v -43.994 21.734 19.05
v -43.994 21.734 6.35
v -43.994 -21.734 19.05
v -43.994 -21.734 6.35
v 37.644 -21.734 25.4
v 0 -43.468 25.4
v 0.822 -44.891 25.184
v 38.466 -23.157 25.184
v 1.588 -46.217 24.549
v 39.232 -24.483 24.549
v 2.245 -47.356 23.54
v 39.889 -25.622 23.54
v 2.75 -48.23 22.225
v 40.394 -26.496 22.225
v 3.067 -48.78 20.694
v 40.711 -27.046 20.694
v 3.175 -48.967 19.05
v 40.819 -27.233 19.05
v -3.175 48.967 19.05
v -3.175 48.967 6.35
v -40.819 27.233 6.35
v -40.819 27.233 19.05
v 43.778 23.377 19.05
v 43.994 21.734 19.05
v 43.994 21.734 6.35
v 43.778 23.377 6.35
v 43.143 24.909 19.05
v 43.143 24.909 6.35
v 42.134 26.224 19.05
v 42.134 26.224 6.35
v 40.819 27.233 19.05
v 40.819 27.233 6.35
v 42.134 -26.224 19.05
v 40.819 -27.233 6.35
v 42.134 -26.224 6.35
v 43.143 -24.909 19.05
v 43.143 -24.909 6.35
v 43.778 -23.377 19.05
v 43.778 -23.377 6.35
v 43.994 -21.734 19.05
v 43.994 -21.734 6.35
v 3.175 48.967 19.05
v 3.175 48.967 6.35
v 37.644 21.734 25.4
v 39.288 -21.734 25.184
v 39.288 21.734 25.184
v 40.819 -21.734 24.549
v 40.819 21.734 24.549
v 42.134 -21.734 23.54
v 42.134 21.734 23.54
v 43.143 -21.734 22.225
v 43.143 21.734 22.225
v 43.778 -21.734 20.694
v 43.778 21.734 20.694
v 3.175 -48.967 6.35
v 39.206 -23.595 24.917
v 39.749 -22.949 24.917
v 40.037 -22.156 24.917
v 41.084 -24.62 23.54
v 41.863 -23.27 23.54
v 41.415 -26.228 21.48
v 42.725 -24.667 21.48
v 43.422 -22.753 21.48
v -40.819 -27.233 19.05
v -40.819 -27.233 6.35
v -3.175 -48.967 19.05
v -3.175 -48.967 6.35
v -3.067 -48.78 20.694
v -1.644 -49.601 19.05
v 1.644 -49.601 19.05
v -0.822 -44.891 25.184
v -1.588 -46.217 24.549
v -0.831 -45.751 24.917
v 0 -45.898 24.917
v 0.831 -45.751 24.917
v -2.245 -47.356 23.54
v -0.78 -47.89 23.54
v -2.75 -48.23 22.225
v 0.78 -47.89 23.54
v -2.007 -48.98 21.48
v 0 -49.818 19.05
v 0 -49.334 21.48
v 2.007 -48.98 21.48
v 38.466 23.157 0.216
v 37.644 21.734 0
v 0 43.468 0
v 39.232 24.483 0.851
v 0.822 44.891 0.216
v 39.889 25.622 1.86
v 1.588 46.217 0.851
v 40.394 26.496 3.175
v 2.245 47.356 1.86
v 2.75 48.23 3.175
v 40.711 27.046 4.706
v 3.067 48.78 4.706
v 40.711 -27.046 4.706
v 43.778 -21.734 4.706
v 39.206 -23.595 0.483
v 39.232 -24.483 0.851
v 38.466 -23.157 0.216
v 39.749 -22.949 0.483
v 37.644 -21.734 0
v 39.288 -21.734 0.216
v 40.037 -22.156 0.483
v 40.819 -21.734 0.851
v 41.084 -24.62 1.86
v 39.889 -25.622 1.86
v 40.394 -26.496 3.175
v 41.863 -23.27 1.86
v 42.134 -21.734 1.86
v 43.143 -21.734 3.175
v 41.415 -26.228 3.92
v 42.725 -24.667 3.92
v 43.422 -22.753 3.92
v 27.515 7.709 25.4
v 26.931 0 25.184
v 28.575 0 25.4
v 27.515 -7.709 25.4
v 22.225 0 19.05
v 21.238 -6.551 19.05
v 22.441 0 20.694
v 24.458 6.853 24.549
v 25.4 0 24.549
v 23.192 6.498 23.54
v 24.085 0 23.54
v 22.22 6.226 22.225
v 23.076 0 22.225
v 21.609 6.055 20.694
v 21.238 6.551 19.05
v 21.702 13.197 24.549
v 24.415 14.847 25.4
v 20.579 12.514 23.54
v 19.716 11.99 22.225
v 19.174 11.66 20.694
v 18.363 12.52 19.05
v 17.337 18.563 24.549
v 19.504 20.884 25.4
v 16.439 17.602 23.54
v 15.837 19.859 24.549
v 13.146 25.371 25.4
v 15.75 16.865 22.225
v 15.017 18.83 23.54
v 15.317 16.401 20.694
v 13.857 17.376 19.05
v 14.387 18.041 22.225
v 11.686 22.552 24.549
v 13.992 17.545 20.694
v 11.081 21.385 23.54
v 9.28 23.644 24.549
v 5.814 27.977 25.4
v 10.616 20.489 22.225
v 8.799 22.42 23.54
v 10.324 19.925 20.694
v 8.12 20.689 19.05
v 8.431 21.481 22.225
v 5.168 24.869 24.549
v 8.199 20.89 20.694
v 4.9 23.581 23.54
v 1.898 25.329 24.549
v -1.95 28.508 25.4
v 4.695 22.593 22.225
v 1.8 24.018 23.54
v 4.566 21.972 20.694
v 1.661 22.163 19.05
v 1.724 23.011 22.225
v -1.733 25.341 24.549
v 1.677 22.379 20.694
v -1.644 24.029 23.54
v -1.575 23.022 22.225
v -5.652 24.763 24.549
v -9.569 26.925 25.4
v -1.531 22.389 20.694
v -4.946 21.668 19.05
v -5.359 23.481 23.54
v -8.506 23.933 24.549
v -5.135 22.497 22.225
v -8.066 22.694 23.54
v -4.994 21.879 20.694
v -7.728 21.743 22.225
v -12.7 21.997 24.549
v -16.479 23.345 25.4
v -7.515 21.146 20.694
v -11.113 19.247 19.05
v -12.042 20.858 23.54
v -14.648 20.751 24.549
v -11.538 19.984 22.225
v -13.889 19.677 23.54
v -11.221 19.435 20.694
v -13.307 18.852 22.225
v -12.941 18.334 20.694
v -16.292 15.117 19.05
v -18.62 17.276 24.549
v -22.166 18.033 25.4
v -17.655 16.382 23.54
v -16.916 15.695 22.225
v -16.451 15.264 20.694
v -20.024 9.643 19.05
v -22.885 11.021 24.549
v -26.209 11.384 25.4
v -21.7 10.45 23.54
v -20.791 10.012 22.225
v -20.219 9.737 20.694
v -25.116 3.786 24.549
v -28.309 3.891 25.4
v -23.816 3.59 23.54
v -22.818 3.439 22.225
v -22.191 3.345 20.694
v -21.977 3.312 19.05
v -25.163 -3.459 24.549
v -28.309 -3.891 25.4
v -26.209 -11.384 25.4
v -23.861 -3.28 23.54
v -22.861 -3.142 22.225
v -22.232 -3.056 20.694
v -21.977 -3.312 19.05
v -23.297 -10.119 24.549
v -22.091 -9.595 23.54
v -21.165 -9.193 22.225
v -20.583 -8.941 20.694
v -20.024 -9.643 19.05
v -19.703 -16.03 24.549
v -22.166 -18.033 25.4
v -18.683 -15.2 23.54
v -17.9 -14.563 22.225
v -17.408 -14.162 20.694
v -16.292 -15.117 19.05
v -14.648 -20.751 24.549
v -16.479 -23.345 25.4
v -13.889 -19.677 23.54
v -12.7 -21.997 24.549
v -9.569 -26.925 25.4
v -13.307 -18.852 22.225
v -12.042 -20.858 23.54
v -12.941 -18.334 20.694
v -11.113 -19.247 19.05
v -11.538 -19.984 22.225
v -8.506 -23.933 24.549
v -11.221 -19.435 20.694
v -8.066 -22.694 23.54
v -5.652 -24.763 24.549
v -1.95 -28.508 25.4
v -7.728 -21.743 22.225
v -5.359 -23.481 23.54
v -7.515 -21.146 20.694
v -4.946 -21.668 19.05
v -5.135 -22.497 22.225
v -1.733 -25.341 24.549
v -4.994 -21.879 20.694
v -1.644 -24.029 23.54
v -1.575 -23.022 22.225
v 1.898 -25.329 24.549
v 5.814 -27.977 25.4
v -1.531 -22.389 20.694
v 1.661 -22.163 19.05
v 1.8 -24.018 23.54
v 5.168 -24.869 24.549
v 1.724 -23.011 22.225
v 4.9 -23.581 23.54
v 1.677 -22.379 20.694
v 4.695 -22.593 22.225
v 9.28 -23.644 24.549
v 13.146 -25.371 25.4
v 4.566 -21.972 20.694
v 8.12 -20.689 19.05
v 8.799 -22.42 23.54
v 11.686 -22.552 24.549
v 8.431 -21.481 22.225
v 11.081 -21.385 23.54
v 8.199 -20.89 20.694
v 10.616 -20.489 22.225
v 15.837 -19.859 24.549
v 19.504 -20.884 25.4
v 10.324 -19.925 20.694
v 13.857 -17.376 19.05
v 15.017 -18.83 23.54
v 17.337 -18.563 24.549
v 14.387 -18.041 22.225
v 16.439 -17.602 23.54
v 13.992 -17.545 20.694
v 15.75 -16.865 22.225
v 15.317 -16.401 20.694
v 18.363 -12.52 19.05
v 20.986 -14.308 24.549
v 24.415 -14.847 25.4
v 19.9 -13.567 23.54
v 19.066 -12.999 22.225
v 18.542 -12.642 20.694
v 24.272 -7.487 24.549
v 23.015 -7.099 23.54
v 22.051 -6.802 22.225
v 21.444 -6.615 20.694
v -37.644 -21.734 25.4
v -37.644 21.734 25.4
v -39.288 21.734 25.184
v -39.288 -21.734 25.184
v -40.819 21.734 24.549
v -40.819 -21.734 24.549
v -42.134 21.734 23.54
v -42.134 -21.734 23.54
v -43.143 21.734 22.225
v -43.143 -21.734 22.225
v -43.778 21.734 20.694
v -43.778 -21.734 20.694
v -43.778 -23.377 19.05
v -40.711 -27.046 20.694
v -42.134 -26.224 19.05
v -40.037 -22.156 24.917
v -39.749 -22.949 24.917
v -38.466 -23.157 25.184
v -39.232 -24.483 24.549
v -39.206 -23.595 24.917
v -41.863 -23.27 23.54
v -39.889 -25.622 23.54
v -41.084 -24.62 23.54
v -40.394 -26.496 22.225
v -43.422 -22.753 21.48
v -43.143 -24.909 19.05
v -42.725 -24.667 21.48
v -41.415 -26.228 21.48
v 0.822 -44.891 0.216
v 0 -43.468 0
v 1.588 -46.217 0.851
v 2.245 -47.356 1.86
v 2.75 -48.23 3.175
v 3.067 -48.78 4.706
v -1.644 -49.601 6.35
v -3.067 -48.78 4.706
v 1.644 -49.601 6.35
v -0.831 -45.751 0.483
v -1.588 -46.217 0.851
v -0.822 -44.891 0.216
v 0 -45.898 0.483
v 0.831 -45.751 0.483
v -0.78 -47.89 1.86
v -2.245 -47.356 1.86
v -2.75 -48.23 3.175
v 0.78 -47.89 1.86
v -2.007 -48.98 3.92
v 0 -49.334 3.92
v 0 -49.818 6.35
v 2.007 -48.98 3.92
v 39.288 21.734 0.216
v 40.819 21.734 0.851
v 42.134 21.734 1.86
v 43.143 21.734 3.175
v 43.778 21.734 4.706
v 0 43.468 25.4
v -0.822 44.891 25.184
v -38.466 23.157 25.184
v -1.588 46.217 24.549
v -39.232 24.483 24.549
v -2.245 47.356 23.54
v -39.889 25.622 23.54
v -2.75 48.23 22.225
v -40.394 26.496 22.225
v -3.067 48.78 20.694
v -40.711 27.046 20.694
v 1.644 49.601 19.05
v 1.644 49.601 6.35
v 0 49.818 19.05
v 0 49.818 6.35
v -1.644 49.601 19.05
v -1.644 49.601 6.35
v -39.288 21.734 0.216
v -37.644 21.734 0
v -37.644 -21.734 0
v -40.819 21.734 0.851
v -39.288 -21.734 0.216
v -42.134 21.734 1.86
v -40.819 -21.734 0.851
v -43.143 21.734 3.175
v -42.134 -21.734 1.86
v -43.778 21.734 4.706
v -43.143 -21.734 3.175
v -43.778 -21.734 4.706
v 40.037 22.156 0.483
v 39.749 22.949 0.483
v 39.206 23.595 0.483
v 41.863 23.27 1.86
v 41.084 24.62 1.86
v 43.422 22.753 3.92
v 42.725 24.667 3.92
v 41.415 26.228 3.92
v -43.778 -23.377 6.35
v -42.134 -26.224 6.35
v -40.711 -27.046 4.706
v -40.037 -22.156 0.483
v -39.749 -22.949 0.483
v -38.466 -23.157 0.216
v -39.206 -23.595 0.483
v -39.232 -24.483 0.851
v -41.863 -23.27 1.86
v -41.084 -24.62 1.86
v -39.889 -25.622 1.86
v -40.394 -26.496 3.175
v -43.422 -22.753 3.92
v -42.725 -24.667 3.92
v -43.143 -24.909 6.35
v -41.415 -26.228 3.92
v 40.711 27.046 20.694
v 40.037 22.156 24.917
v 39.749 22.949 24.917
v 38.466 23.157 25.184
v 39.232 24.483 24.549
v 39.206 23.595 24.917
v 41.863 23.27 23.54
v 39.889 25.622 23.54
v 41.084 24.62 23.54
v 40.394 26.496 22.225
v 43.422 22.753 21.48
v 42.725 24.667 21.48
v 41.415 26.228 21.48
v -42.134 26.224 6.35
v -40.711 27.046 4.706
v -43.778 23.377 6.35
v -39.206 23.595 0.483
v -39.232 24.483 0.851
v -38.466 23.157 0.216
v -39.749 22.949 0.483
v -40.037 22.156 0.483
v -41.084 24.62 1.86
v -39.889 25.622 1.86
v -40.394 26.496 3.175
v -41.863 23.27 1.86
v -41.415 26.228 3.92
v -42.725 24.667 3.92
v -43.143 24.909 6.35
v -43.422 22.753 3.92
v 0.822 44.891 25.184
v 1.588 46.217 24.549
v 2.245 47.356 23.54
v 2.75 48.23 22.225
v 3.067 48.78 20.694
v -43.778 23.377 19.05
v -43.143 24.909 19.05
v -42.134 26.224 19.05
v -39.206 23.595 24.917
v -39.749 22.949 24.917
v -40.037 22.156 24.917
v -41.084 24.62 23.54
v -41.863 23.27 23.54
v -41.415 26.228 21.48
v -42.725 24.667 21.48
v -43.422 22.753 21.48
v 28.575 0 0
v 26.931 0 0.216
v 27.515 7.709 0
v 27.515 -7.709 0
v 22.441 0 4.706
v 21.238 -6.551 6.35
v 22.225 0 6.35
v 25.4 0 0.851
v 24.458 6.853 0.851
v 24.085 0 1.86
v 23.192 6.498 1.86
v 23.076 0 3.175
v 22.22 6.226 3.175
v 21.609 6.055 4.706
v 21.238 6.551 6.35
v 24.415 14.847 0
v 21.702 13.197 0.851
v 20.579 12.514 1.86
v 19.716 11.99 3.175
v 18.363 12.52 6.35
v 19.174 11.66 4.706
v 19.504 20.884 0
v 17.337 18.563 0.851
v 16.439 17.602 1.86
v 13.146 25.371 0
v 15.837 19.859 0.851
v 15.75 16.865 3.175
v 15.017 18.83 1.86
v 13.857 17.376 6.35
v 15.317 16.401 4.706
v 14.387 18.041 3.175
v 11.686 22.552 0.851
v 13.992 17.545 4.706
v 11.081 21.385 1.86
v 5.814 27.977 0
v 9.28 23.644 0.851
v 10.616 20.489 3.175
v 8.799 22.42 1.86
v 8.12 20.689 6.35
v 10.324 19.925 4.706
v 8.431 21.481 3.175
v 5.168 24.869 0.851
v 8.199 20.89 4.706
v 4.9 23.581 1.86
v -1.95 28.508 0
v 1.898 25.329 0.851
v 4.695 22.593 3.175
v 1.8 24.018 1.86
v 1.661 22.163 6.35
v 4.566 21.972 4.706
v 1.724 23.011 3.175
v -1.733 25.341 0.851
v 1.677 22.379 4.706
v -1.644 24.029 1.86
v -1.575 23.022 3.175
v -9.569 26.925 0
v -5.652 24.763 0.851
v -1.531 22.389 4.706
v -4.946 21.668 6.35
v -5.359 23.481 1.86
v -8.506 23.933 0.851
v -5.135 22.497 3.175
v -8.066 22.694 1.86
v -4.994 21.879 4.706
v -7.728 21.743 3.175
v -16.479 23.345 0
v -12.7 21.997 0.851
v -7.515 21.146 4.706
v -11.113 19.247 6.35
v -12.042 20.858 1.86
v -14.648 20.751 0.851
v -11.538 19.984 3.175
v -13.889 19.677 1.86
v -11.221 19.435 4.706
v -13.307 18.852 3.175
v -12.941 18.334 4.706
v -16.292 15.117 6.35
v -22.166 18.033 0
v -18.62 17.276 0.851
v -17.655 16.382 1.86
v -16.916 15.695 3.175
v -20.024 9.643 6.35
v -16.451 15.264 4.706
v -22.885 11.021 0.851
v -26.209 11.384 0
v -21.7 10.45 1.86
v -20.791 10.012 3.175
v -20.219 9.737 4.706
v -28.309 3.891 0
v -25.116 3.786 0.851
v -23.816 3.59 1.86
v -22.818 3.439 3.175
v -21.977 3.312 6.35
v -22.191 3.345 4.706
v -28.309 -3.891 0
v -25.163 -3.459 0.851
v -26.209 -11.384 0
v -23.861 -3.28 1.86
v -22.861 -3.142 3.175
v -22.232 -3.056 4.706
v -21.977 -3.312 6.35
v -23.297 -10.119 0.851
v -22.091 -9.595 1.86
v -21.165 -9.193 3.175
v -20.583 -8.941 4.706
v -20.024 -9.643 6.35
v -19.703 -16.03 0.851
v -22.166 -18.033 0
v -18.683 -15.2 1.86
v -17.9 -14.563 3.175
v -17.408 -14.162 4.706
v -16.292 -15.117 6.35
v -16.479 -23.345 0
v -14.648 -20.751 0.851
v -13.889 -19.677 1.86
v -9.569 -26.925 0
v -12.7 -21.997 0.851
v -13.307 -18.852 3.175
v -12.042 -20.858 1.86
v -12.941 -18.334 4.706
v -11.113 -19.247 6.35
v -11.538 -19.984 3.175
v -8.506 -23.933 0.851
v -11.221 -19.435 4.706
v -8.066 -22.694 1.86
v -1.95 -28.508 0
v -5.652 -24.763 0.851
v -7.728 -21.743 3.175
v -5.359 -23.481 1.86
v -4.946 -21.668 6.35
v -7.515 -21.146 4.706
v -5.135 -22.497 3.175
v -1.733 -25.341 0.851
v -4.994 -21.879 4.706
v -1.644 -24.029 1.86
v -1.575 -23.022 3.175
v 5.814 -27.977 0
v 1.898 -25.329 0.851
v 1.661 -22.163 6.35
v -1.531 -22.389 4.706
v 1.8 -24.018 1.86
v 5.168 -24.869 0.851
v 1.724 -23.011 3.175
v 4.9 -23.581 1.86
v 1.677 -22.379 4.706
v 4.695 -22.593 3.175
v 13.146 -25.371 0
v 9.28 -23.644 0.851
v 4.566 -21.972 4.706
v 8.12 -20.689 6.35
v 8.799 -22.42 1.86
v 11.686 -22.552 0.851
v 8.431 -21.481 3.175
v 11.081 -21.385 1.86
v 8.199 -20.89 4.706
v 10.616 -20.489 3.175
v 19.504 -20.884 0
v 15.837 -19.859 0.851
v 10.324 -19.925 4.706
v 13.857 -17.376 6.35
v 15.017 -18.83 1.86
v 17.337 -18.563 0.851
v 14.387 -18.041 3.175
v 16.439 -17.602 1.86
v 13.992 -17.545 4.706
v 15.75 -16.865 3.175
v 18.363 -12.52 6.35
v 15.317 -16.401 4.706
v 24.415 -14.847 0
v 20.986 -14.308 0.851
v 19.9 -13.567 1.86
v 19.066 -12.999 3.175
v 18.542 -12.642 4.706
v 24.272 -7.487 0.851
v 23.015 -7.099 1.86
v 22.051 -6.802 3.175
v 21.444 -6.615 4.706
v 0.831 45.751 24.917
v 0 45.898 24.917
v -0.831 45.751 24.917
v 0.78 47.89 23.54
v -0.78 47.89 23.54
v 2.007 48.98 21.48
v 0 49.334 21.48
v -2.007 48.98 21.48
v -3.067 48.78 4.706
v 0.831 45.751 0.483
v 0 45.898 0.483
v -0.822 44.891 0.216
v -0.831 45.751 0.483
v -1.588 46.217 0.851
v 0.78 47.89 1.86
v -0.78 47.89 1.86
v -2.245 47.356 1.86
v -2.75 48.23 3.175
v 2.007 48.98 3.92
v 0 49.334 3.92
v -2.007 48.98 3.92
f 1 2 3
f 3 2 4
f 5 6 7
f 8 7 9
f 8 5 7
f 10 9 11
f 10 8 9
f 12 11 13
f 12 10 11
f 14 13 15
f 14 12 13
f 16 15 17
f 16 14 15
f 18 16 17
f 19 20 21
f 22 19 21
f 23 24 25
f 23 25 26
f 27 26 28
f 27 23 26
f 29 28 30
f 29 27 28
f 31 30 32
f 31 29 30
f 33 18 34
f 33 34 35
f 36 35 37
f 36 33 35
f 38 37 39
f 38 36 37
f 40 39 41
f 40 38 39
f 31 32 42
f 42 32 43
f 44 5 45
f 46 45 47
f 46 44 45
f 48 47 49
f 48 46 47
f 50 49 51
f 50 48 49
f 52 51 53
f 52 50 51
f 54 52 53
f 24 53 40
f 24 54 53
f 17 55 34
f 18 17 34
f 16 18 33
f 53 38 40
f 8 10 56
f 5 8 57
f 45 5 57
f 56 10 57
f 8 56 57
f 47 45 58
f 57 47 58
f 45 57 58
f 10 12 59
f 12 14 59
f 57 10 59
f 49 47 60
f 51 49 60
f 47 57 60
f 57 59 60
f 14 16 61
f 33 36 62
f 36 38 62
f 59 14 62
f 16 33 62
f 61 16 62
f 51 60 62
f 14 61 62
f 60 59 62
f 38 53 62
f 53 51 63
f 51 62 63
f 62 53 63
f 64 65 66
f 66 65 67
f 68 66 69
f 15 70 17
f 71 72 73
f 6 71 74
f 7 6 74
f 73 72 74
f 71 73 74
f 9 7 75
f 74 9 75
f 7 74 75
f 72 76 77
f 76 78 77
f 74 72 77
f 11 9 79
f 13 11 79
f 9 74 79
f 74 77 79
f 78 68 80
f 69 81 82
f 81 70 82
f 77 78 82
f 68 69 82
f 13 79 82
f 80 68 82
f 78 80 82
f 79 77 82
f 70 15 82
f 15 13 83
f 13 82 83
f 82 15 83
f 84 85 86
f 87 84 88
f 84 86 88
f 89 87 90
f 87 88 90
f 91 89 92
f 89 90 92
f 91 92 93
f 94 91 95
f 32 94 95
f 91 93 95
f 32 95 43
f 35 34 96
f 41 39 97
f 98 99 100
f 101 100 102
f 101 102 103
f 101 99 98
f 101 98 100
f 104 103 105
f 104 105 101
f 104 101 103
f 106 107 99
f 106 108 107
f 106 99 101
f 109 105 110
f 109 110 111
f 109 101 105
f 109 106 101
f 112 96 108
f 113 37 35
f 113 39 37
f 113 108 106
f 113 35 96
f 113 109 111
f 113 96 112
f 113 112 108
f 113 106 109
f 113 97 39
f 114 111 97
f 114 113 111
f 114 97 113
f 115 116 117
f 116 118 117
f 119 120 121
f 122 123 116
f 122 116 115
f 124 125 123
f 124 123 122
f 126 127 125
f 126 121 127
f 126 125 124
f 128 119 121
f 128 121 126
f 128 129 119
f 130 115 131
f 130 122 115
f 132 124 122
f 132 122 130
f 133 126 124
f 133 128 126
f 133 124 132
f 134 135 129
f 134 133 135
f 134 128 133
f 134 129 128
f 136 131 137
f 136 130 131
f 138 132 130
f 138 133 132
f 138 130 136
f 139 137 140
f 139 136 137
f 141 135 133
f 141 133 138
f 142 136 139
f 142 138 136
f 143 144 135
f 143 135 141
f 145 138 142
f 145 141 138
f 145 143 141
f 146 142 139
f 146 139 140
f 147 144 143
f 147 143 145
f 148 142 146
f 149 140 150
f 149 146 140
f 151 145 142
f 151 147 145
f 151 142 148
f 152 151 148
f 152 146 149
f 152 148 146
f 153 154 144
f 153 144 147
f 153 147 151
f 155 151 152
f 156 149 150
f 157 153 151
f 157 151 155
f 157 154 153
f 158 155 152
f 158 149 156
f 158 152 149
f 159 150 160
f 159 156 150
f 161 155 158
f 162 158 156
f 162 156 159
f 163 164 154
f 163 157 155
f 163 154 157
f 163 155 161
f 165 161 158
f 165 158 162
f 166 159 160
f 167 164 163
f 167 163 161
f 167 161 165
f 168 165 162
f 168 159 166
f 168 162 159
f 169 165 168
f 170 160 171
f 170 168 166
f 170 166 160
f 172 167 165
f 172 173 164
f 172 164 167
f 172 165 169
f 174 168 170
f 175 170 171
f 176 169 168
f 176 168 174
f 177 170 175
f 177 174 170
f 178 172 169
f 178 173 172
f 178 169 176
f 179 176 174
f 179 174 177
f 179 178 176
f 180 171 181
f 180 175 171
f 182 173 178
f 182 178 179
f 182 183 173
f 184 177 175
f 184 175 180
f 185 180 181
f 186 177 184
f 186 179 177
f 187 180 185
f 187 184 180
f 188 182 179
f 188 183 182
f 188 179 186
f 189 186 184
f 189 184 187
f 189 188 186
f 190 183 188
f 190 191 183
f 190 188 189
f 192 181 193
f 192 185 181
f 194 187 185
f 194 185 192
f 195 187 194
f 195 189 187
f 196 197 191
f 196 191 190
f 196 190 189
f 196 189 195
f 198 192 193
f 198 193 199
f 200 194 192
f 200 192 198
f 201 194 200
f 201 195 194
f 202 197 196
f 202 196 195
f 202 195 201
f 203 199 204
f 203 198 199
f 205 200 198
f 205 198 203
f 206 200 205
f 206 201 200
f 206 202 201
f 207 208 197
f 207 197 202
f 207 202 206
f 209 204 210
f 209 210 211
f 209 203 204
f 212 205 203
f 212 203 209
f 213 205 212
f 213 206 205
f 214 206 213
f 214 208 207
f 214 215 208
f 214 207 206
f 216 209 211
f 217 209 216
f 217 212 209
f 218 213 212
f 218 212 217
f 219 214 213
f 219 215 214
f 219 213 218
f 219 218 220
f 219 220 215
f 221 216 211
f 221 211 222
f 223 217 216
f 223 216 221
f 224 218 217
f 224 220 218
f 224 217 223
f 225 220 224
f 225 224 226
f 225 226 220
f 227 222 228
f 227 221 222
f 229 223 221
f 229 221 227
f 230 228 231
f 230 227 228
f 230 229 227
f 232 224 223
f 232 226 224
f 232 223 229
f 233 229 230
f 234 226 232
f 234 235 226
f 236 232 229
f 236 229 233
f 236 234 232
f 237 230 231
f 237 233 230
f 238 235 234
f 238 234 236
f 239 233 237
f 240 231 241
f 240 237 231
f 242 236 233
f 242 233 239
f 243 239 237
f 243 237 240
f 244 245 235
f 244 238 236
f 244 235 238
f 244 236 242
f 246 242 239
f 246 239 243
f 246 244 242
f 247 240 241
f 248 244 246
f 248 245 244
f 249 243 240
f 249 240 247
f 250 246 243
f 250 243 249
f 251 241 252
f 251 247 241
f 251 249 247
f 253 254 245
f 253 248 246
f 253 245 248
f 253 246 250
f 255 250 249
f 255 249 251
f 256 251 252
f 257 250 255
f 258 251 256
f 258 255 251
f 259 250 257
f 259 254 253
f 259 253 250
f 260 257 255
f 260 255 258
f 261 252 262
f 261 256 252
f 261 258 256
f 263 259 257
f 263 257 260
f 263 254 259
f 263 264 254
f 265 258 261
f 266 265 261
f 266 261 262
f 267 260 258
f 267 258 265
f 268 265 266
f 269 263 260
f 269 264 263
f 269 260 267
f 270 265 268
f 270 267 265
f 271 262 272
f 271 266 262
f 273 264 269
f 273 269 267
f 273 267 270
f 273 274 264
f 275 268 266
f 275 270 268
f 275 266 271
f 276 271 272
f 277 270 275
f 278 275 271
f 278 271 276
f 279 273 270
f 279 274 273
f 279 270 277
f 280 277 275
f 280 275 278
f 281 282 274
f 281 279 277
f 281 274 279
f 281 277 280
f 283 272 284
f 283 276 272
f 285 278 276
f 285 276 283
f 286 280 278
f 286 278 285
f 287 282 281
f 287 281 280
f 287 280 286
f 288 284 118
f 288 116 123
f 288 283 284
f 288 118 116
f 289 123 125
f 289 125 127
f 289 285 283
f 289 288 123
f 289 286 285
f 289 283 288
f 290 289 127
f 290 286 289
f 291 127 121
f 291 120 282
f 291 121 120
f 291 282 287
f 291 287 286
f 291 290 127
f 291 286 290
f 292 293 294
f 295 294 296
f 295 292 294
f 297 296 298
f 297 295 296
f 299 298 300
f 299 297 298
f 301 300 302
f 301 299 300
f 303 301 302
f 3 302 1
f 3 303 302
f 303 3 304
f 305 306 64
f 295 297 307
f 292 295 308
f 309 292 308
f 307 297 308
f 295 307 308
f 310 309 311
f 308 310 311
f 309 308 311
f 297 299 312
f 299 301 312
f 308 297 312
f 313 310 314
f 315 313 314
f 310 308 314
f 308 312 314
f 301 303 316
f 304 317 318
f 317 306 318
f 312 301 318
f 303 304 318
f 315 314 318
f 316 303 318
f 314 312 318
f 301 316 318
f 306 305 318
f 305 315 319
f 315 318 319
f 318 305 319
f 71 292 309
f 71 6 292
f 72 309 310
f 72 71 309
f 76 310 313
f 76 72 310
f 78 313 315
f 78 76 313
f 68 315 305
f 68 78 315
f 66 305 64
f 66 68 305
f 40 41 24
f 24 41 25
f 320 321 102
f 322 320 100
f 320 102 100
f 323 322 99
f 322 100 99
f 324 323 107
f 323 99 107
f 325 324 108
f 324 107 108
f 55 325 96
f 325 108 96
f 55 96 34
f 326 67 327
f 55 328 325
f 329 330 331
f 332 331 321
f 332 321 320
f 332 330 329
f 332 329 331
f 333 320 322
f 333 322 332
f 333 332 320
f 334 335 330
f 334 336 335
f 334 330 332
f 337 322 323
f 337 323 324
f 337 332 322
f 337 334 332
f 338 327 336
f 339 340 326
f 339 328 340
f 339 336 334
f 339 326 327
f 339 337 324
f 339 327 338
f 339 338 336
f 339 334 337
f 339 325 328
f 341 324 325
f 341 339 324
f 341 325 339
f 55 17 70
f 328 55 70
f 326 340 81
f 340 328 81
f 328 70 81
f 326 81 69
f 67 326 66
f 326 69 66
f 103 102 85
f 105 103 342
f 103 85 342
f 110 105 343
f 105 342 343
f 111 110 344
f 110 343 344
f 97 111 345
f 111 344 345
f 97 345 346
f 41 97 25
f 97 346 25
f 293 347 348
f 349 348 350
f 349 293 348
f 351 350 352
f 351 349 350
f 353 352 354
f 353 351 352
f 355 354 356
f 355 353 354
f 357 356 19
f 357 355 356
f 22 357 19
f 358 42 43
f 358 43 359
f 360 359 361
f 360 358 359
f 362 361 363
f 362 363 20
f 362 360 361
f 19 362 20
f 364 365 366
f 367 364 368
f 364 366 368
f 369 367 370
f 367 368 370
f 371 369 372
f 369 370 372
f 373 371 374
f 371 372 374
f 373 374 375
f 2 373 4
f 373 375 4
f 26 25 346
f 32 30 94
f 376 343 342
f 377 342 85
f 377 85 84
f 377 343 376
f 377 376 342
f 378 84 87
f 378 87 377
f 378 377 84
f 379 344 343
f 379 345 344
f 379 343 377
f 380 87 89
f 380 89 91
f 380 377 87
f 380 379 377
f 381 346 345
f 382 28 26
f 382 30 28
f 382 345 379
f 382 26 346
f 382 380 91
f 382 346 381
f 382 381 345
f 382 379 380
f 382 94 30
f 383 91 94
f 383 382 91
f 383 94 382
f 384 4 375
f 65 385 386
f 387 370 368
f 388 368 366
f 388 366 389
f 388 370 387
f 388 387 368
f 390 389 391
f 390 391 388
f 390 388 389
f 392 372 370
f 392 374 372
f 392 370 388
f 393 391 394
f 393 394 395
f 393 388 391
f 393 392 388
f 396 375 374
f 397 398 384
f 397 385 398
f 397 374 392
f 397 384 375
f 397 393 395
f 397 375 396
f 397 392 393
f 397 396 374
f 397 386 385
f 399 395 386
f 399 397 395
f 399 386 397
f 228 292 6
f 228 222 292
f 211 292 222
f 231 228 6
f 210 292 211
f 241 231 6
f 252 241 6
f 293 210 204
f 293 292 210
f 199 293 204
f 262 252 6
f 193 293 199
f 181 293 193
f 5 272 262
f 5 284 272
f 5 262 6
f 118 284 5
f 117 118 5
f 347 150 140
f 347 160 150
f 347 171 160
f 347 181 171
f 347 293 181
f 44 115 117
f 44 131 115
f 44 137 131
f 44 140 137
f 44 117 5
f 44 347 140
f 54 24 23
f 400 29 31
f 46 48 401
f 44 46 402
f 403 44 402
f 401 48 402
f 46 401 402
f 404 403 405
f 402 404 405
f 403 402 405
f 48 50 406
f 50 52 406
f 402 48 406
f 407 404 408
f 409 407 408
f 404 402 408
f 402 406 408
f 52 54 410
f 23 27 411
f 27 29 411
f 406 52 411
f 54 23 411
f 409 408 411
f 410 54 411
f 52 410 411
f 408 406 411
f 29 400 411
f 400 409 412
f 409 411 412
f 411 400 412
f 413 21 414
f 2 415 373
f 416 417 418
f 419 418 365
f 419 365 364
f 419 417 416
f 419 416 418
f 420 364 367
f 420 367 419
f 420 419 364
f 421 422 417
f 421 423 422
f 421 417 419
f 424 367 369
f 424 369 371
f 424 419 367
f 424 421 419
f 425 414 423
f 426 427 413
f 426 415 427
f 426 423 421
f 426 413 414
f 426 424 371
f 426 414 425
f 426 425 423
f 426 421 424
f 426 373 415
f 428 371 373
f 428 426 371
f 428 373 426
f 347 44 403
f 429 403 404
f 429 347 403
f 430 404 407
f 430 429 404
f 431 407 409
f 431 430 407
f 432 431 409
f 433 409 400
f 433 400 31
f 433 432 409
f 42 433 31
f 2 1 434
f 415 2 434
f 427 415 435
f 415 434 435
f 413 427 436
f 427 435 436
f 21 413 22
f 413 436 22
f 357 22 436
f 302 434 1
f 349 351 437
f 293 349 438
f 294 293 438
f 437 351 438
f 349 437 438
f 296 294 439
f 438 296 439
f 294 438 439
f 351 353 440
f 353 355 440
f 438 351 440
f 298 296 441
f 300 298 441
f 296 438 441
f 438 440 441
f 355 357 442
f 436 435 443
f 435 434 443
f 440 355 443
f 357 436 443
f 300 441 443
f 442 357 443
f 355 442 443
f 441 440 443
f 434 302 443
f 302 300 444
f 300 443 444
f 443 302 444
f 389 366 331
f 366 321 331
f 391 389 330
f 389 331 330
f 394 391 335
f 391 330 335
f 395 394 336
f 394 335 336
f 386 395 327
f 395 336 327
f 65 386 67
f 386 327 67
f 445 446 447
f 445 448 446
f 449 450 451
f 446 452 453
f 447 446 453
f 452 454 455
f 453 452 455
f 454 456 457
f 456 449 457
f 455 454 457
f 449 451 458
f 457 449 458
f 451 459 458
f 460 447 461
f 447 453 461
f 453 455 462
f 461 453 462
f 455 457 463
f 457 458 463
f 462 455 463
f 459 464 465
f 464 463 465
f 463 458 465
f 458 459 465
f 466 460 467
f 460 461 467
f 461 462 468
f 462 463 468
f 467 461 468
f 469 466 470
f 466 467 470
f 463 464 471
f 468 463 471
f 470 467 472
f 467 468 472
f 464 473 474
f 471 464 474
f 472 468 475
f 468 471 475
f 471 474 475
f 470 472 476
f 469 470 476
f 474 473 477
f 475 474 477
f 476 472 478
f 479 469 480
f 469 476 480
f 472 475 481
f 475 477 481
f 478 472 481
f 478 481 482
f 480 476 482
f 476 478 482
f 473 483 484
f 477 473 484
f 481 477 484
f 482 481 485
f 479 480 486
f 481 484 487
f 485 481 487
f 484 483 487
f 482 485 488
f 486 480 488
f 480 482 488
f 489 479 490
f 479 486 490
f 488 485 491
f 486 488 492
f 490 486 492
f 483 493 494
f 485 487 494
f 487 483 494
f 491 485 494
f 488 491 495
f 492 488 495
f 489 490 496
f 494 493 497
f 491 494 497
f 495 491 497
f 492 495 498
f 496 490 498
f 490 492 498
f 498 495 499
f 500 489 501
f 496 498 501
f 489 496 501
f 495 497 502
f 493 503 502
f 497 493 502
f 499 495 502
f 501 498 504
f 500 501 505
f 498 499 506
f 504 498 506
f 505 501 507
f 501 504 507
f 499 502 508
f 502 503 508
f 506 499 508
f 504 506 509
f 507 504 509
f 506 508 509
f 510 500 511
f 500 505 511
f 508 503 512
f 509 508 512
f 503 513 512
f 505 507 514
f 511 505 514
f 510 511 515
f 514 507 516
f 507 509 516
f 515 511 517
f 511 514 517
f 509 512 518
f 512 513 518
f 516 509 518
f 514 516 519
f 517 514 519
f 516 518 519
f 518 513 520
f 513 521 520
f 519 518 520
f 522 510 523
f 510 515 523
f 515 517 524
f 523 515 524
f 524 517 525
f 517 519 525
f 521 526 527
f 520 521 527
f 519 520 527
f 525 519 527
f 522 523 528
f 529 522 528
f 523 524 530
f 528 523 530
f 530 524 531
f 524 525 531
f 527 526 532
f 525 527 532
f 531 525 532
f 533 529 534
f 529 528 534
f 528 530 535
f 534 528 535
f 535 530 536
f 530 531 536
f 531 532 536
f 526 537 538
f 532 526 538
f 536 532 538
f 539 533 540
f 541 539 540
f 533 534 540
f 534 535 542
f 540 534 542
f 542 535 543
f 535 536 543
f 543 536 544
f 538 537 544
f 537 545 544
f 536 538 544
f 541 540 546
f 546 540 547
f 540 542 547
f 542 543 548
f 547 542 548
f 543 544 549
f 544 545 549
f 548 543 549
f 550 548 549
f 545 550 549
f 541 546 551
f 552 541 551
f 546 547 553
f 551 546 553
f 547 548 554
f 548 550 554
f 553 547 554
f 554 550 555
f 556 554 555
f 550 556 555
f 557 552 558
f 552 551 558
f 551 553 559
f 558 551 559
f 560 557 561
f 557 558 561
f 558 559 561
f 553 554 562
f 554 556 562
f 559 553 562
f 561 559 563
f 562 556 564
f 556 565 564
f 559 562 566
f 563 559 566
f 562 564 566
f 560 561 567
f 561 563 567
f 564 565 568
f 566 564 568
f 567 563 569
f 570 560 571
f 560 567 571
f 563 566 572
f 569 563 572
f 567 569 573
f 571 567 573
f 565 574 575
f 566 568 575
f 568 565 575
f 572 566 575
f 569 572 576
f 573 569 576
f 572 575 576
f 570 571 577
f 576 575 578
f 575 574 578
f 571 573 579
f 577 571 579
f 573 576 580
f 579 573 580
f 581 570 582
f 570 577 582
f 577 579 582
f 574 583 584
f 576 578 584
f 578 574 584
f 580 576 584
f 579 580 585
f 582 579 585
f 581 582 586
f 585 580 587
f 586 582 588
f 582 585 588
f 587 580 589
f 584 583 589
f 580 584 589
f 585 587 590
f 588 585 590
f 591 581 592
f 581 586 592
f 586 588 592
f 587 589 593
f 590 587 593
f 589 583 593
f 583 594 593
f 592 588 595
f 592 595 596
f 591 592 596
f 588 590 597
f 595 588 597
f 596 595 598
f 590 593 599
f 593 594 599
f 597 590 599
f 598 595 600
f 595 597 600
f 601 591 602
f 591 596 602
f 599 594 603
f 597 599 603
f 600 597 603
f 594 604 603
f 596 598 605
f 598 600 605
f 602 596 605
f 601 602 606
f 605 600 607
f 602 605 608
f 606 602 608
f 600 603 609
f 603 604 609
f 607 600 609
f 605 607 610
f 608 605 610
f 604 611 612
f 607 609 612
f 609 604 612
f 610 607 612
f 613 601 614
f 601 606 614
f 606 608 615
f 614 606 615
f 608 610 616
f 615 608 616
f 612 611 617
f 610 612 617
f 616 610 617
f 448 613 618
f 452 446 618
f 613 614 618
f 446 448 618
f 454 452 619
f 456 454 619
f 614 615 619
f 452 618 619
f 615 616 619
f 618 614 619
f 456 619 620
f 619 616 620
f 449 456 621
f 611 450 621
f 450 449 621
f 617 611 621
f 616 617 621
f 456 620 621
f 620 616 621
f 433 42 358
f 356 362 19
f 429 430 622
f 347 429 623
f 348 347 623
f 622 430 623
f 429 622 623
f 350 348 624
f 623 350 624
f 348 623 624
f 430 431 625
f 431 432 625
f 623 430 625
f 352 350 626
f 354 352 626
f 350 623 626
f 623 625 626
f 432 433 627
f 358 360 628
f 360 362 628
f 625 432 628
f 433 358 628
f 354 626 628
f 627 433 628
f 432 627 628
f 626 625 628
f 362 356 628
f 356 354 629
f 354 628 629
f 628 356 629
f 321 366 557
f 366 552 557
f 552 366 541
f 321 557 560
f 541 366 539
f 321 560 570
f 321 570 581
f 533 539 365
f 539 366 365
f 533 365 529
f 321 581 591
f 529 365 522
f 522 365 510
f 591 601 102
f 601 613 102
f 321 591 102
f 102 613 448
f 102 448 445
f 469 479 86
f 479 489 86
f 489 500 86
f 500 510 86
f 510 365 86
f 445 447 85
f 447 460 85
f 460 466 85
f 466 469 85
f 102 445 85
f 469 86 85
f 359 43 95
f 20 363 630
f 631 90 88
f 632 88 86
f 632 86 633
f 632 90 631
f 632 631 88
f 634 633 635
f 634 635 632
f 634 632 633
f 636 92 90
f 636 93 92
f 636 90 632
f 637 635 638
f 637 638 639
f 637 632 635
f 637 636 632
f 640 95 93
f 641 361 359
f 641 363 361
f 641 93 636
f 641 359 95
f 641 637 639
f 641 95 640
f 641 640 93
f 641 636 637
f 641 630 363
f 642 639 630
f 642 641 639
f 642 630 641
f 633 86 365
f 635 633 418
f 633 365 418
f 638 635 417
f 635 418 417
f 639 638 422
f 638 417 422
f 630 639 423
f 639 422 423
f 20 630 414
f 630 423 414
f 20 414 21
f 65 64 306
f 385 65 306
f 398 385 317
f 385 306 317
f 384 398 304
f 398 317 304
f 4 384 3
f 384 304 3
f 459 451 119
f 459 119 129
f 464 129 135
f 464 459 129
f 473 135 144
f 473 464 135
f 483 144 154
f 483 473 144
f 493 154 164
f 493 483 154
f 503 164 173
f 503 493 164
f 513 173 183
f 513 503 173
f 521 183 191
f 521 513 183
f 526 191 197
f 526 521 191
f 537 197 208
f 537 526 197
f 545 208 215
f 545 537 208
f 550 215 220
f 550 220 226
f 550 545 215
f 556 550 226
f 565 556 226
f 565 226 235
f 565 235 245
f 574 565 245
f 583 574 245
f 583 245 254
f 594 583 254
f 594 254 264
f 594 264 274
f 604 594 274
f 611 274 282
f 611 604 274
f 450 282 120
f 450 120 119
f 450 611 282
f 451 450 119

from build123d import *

# Parameters (mm, degrees)
F0_R     = 22.225
F1_DEPTH = 25.4
F2_R     = 6.35
F3_R     = 6.35


# Not quite as in the source:
# - a feature names something its author has since deleted; it is built from what else it names


with BuildPart() as f1:
    # F0 (on Top) → F1 (new body)
    with BuildSketch(Plane.XY):
        Polygon((0, -50.8), (43.9940905122, -25.4), (43.9940905122, 25.4), (0, 50.8), (-43.9940905122, 25.4), (-43.9940905122, -25.4), align=None)
        Circle(F0_R, mode=Mode.SUBTRACT)
    extrude(amount=F1_DEPTH)

    # F2
    f2_edges = [f1.edges().sort_by_distance(p)[0] for p in [
        (-43.994091, -25.4, 12.7),
        (-43.994091, 25.4, 12.7),
        (0, -50.8, 12.7),
        (43.994091, -25.4, 12.7),
        (43.994091, 25.4, 12.7),
        (0, 50.8, 12.7),
    ]]
    fillet(f2_edges, radius=F2_R)

    # F3
    f3_edges = [f1.edges().sort_by_distance(p)[0] for p in [
        (-21.997045, -38.1, 25.4),
        (-21.997045, -38.1, 0),
        (-22.225, 0, 25.4),
        (-22.225, 0, 0),
    ]]
    fillet(f3_edges, radius=F3_R)


solid = f1.part
